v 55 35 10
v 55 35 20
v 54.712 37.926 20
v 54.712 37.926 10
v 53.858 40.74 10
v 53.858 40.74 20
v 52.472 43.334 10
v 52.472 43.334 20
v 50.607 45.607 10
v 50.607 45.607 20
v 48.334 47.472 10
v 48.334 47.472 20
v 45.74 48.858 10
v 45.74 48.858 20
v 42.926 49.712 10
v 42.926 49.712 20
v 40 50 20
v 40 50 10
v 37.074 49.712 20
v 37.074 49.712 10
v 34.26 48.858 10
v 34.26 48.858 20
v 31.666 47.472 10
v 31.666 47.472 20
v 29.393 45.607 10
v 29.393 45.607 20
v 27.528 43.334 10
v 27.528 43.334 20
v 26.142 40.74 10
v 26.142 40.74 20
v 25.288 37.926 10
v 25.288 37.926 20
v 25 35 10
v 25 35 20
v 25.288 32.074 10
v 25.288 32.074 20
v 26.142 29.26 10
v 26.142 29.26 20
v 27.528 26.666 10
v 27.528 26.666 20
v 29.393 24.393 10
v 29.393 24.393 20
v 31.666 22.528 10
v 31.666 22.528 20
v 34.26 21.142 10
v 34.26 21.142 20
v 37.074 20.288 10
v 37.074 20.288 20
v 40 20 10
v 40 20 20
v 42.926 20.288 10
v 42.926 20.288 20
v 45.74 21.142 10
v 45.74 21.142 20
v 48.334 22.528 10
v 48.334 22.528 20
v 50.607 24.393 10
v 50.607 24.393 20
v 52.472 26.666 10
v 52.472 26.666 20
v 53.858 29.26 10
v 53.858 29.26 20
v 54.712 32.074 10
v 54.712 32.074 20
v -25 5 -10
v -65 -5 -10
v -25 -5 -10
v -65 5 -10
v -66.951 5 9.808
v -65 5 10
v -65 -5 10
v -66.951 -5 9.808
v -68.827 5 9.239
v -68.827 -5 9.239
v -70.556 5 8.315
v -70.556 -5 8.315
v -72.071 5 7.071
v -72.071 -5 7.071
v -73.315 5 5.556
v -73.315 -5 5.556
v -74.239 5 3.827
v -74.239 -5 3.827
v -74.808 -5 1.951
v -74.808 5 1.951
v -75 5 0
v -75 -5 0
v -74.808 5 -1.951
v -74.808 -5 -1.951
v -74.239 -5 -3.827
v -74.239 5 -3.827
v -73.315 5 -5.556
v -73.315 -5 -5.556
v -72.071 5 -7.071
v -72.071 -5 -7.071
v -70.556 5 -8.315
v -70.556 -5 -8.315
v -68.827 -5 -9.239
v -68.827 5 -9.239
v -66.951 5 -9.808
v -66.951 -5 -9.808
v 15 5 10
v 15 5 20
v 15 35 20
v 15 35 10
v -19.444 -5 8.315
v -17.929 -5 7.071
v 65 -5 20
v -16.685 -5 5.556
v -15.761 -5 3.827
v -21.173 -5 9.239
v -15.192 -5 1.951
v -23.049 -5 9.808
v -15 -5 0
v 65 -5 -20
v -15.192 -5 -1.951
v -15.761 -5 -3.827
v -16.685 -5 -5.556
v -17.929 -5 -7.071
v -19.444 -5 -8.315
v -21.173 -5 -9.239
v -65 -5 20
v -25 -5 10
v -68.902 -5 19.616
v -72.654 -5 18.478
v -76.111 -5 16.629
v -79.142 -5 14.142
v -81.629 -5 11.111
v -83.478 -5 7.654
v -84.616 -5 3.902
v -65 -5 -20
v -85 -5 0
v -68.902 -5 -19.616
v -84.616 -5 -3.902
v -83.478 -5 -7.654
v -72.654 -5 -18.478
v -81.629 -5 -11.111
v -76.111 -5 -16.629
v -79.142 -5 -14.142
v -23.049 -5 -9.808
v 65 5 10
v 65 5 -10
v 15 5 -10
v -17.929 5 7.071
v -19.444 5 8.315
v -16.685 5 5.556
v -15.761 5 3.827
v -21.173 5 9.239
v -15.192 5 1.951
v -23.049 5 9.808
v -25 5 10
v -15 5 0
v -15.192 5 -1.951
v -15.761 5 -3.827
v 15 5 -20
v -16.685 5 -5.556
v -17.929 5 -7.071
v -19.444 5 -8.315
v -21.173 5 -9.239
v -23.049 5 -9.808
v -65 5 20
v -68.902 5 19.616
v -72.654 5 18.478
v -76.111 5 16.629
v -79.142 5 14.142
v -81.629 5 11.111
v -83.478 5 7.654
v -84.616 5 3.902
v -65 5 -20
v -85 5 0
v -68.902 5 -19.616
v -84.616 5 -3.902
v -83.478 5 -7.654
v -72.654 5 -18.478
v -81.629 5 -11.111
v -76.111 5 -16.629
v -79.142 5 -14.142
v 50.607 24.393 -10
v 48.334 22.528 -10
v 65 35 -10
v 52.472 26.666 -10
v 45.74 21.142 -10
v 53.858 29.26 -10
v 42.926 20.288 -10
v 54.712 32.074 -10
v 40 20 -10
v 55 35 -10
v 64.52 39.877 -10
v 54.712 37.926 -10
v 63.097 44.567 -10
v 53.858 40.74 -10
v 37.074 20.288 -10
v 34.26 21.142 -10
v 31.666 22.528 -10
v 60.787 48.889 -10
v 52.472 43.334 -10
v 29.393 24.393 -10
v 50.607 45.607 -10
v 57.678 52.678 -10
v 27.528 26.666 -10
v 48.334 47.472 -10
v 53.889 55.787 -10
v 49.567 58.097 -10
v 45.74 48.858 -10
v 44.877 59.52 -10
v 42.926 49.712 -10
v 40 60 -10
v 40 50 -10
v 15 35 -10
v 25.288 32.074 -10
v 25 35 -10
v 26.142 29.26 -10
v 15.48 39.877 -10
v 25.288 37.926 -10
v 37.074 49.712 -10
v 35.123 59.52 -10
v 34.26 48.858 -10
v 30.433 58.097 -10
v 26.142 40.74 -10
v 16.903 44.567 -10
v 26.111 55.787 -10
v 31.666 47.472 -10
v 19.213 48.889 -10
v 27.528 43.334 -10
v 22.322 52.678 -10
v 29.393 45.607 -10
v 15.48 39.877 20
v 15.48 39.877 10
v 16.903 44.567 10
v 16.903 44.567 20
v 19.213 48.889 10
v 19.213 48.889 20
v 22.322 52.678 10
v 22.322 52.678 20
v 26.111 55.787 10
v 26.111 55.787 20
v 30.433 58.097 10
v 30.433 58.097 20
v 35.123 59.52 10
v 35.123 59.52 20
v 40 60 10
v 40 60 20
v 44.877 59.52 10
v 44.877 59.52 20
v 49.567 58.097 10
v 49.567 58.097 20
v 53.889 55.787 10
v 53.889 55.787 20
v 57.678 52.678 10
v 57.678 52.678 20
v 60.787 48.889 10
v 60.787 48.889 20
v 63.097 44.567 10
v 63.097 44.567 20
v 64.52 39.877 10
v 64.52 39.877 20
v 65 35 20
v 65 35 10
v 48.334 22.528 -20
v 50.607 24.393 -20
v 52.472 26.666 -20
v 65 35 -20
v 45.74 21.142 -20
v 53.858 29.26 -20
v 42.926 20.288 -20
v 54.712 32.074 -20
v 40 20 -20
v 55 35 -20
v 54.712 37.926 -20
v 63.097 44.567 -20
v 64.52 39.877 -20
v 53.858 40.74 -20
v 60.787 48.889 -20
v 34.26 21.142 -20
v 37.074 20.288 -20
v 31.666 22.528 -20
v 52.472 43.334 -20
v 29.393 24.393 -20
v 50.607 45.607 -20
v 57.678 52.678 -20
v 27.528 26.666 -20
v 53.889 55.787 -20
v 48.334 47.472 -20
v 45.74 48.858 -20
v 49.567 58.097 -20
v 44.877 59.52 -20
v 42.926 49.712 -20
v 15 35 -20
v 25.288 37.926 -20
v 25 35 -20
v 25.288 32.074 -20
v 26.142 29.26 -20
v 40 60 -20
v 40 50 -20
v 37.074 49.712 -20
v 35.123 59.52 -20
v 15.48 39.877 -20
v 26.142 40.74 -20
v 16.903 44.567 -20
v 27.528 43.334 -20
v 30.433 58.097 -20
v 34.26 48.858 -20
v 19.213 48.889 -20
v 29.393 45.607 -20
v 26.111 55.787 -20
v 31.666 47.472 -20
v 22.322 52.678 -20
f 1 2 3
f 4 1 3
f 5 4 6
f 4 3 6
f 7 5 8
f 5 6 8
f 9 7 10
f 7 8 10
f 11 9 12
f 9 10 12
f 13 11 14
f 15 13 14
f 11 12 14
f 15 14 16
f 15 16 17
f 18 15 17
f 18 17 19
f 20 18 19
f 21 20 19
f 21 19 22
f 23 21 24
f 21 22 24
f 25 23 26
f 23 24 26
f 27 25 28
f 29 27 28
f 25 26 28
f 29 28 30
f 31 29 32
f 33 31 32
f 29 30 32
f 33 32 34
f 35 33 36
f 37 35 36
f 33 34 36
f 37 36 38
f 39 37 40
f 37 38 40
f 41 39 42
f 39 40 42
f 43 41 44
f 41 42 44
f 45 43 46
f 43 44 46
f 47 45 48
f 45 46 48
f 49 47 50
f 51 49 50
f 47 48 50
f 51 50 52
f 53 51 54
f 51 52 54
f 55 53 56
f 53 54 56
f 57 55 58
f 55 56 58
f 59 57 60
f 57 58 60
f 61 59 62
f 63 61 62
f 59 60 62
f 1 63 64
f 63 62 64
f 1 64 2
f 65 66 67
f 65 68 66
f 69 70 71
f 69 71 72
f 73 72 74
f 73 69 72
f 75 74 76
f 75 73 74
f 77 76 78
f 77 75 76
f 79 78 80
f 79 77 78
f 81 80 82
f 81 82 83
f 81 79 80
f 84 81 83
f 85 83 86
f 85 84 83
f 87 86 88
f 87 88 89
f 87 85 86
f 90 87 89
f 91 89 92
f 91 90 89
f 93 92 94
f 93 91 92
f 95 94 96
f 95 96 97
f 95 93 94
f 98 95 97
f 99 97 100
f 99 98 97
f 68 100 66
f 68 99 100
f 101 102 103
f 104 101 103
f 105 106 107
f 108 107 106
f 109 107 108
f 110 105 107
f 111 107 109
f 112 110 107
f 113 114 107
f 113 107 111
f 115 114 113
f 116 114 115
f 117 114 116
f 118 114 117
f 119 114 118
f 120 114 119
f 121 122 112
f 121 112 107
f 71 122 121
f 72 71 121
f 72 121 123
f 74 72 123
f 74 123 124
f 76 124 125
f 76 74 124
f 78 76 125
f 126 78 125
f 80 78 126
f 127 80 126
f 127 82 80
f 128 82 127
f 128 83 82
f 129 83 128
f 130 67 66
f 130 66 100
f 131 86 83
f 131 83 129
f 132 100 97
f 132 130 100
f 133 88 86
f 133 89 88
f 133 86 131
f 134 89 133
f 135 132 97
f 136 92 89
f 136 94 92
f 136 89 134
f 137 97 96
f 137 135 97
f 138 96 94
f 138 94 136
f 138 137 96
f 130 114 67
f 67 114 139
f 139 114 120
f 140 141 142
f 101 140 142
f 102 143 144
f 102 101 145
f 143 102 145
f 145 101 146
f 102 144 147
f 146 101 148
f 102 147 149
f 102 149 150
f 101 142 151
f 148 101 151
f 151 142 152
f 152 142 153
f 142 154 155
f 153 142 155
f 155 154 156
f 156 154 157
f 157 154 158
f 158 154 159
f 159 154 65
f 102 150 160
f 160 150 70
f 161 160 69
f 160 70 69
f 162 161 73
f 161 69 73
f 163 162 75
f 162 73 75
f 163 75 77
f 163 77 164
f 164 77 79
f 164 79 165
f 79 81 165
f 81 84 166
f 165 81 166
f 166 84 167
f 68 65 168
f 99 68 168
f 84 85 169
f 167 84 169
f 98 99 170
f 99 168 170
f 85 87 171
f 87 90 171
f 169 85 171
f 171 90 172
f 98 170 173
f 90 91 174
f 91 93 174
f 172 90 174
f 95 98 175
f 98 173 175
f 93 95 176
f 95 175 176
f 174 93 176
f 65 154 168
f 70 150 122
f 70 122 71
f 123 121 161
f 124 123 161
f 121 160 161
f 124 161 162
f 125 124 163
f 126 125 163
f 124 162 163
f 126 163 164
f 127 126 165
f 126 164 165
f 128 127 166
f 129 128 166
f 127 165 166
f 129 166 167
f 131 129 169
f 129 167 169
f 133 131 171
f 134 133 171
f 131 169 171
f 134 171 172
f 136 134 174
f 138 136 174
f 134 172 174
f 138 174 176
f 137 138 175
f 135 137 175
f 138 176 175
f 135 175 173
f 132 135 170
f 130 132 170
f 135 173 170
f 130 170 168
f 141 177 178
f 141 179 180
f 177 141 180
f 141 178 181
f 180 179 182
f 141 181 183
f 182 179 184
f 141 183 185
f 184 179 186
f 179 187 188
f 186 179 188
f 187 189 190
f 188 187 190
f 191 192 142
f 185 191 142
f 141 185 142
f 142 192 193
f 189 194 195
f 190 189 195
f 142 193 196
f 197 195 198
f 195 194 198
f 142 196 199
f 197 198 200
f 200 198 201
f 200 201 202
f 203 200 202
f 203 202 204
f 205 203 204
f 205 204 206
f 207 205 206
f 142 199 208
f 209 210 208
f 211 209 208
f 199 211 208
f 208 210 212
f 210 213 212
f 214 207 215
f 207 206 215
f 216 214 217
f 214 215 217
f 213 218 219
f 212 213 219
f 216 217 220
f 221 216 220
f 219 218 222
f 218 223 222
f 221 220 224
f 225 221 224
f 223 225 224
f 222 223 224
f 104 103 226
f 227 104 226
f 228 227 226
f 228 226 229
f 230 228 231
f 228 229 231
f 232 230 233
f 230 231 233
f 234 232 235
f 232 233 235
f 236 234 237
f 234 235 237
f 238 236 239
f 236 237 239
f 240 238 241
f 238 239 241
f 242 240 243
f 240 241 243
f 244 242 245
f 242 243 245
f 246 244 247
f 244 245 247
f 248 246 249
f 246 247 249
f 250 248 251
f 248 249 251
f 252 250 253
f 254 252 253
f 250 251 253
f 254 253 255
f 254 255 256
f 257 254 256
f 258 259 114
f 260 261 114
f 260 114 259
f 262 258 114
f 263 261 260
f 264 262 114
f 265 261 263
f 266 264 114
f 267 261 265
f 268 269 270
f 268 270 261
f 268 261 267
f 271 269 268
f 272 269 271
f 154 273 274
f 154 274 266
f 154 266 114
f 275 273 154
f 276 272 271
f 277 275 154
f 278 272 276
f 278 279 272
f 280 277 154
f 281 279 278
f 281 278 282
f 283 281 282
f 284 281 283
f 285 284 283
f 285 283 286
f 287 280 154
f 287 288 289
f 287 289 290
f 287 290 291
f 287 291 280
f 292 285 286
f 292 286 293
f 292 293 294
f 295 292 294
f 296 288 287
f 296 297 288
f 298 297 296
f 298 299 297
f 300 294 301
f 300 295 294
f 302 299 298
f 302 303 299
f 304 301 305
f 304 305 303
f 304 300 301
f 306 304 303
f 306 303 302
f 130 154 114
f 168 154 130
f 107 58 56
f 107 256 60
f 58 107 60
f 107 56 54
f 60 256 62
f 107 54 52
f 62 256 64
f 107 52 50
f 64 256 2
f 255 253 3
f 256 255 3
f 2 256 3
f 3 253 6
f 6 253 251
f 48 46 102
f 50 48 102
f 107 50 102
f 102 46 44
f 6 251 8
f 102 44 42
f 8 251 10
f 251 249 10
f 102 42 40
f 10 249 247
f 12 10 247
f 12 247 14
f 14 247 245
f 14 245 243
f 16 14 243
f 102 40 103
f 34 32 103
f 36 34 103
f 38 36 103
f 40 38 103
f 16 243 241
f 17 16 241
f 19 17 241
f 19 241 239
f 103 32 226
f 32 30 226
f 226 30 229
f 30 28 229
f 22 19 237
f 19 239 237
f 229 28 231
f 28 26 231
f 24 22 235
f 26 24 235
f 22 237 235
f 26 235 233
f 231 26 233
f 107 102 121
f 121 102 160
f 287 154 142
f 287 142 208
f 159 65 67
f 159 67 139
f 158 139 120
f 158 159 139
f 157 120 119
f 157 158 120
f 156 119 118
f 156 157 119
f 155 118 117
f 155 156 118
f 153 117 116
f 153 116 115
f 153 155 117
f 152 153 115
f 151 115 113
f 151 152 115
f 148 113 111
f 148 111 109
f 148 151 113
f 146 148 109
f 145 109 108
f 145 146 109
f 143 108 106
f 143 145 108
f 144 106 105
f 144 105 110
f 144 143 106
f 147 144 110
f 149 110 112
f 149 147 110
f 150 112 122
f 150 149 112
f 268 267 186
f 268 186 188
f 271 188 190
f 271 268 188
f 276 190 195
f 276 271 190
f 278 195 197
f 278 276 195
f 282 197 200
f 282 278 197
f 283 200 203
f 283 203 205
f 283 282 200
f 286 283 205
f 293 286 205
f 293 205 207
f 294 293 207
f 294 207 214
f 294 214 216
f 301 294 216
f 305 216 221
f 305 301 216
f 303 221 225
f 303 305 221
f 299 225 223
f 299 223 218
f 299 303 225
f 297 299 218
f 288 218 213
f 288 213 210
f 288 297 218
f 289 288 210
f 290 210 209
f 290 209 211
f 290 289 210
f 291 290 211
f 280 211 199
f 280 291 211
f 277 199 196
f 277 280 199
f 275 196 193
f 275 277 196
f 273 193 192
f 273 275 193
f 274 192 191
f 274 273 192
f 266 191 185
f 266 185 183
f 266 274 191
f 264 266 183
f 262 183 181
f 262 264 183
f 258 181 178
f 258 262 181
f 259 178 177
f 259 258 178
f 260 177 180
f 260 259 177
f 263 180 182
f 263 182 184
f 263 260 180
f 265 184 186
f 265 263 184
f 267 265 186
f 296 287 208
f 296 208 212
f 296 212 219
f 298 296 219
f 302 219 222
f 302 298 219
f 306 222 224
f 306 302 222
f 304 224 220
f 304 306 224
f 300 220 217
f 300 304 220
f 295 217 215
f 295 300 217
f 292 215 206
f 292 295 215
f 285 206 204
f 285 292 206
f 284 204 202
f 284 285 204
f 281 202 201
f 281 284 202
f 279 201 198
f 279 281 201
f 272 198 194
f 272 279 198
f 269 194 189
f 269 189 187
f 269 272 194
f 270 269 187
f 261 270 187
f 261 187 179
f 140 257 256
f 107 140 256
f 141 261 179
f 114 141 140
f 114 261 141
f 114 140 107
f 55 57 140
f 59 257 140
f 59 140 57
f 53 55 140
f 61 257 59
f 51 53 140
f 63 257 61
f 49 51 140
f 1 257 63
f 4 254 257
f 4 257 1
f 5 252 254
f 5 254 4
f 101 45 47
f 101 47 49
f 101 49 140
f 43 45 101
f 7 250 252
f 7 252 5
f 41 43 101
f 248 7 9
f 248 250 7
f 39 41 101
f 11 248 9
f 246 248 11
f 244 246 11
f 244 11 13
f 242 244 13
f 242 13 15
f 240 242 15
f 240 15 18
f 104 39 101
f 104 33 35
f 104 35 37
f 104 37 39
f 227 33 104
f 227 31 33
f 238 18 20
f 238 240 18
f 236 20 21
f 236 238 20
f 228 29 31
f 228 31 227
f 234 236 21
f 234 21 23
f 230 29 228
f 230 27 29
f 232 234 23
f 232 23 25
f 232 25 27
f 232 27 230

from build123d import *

# Parameters (mm, degrees)
BOSS_EXTRUDE1_DEPTH = 5
SKETCH2_R           = 15
BOSS_EXTRUDE2_DEPTH = 10


with BuildPart() as part:
    # Sketch1 → Boss-Extrude1 (new, symmetric)
    with BuildSketch(Plane(origin=(0, 0, 0), x_dir=(1, 0, 0), z_dir=(0, 1, 0))):
        with BuildLine():
            Line((65, -20), (-65, -20))
            ThreePointArc((-65, -20), (-85, 0), (-65, 20))
            Line((-65, 20), (65, 20))
            Line((65, 20), (65, -20))
        make_face()
        with BuildLine():
            Line((-65, 10), (-25, 10))
            ThreePointArc((-25, 10), (-15, 0), (-25, -10))
            Line((-25, -10), (-65, -10))
            ThreePointArc((-65, -10), (-75, 0), (-65, 10))
        make_face(mode=Mode.SUBTRACT)
    extrude(amount=BOSS_EXTRUDE1_DEPTH, both=True)

    # Sketch2 → Boss-Extrude2 (add)
    with BuildSketch(Plane.XY.offset(20)):
        with BuildLine():
            Line((65, 5), (15, 5))
            Line((15, 5), (15, 35))
            ThreePointArc((15, 35), (40, 60), (65, 35))
            Line((65, 35), (65, 5))
        make_face()
        with Locations((40, 35)):
            Circle(SKETCH2_R, mode=Mode.SUBTRACT)
    boss_extrude2 = extrude(amount=-BOSS_EXTRUDE2_DEPTH)

    # Mirror1: Boss-Extrude2 across plane
    add(boss_extrude2.mirror(Plane.XY))


solid = part.part
